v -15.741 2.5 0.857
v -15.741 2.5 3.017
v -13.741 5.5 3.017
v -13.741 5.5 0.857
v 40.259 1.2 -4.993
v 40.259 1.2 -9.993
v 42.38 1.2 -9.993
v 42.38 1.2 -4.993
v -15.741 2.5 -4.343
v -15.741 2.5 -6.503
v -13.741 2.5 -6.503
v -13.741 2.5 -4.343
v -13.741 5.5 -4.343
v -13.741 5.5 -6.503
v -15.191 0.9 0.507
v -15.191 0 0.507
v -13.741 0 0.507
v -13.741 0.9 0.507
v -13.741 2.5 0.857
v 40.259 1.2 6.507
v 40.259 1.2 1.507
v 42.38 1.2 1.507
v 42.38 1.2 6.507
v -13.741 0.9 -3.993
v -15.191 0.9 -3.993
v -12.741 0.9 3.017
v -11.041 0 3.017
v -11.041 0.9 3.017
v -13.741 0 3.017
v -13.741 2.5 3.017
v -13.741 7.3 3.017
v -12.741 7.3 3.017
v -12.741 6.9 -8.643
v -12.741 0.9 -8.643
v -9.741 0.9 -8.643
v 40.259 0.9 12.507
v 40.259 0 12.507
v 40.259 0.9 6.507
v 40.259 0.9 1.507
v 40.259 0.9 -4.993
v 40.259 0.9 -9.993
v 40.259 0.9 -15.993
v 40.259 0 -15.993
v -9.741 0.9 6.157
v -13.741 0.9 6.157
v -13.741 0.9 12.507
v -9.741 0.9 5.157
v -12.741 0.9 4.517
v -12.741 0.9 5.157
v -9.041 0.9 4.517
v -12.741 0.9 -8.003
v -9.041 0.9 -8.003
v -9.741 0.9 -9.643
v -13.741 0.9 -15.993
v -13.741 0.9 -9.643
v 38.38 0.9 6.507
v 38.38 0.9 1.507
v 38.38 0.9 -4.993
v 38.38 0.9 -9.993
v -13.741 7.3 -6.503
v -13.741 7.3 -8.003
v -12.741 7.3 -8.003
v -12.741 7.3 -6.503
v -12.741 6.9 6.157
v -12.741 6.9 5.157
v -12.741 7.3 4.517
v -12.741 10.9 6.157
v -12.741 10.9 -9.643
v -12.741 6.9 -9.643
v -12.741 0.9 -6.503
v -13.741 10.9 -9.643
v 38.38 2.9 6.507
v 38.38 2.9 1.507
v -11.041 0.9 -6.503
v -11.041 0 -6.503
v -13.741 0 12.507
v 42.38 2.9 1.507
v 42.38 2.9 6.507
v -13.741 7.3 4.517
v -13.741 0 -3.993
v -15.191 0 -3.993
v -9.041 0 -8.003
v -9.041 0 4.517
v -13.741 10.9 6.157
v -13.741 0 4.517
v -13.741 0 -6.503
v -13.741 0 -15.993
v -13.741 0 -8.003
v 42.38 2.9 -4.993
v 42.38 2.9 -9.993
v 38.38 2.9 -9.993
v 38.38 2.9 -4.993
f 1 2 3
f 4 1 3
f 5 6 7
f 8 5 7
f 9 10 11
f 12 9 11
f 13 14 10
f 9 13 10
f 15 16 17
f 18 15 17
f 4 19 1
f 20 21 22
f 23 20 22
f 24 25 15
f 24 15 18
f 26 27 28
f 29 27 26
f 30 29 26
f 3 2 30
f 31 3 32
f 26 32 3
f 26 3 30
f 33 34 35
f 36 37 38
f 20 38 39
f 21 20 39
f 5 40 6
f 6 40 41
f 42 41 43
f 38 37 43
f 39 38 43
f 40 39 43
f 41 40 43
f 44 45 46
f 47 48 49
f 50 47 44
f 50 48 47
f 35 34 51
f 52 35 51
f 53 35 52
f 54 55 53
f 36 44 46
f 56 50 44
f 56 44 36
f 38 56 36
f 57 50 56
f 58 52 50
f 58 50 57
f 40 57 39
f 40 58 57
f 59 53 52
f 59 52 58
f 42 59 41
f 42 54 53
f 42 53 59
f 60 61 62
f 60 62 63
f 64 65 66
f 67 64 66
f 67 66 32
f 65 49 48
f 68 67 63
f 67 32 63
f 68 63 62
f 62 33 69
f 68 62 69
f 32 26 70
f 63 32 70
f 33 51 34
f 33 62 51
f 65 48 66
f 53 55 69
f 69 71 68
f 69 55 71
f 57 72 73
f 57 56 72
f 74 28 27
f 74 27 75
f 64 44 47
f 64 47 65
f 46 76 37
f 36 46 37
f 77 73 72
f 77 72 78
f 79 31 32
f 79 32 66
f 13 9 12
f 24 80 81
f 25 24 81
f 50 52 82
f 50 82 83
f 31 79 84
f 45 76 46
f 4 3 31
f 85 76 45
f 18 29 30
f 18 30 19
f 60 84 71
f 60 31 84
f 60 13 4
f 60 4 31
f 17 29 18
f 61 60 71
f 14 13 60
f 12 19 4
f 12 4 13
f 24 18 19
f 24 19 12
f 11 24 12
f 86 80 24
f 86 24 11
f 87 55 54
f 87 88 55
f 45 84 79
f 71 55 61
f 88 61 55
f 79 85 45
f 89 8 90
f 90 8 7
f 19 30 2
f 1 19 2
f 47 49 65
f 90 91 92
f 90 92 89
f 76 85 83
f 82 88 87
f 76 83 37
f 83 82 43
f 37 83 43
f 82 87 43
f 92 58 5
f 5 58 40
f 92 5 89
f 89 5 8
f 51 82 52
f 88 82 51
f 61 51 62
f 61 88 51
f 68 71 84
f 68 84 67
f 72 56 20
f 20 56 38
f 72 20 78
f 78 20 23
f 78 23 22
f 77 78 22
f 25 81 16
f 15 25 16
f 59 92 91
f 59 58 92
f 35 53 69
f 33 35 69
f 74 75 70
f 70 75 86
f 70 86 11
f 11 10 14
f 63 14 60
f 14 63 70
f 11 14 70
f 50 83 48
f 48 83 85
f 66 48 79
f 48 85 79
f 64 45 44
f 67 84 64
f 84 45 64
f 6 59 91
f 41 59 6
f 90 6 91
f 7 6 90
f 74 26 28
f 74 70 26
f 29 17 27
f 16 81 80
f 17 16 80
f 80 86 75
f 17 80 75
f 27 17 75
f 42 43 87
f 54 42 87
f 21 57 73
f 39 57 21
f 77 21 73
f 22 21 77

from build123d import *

# Parameters (mm, degrees)
SALIENTE_EXTRUIR1_DEPTH  = 0.9
CROQUIS2_W               = 1.87835833
CROQUIS2_H               = 5
SALIENTE_EXTRUIR2_DEPTH  = 0.3
CROQUIS3_W               = 4
CROQUIS3_H               = 5
SALIENTE_EXTRUIR4_DEPTH  = 1.7
CROQUIS4_W               = 4
CROQUIS4_H               = 5
SALIENTE_EXTRUIR5_DEPTH  = 1.7
CROQUIS5_W               = 1
CROQUIS5_H               = 15.8
SALIENTE_EXTRUIR6_DEPTH  = 10
SALIENTE_EXTRUIR8_START  = -3.14
SALIENTE_EXTRUIR8_DEPTH  = 2.16
SALIENTE_EXTRUIR9_START  = -3.14
SALIENTE_EXTRUIR9_DEPTH  = 2.16
SALIENTE_EXTRUIR10_DEPTH = 1
SALIENTE_EXTRUIR11_DEPTH = 1
CROQUIS14_W              = 1.5
CROQUIS14_H              = 7.3
CORTAR_EXTRUIR1_DEPTH    = 4.7
CROQUIS16_W              = 2
CROQUIS16_H              = 9.52
CORTAR_EXTRUIR2_DEPTH    = 4.7


with BuildPart() as part:
    # Croquis1 → Saliente-Extruir1 (new body)
    with BuildSketch(Plane(origin=(0, 0, 0), x_dir=(1, 0, 0), z_dir=(0, 1, 0))):
        Polygon((-13.741322015, -0.507016954), (-13.741322015, -12.507016954), (40.258677985, -12.507016954), (40.258677985, 15.992983046), (-13.741322015, 15.992983046), (-13.741322015, 3.992983046), (-15.191322015, 3.992983046), (-15.191322015, -0.507016954), align=None)
    extrude(amount=SALIENTE_EXTRUIR1_DEPTH)

    # Croquis2 → Saliente-Extruir2 (add)
    with BuildSketch(Plane(origin=(0, 0.9, 0), x_dir=(1, 0, 0), z_dir=(0, 1, 0))):
        with Locations((39.31949882, -4.007016954)):
            Rectangle(CROQUIS2_W, CROQUIS2_H)
        with Locations((39.31949882, 7.492983046)):
            Rectangle(CROQUIS2_W, CROQUIS2_H)
    extrude(amount=SALIENTE_EXTRUIR2_DEPTH)

    # Croquis3 → Saliente-Extruir4 (add)
    with BuildSketch(Plane(origin=(0, 1.2, 0), x_dir=(1, 0, 0), z_dir=(0, 1, 0))):
        with Locations((40.380319655, -4.007016954)):
            Rectangle(CROQUIS3_W, CROQUIS3_H)
    extrude(amount=SALIENTE_EXTRUIR4_DEPTH)

    # Croquis4 → Saliente-Extruir5 (add)
    with BuildSketch(Plane(origin=(0, 1.2, 0), x_dir=(1, 0, 0), z_dir=(0, 1, 0))):
        with Locations((40.380319655, 7.492983046)):
            Rectangle(CROQUIS4_W, CROQUIS4_H)
    extrude(amount=SALIENTE_EXTRUIR5_DEPTH)

    # Croquis5 → Saliente-Extruir6 (add)
    with BuildSketch(Plane(origin=(0, 0.9, 0), x_dir=(1, 0, 0), z_dir=(0, 1, 0))):
        with Locations((-13.241322015, 1.742983046)):
            Rectangle(CROQUIS5_W, CROQUIS5_H)
    extrude(amount=SALIENTE_EXTRUIR6_DEPTH)

    # Croquis6 → Saliente-Extruir8 (add)
    with BuildSketch(Plane(origin=(0, 0, -9.642983046), x_dir=(-1, 0, 0), z_dir=(0, 0, -1)).offset(SALIENTE_EXTRUIR8_START)):
        Polygon((13.741322015, 2.5), (13.741322015, 5.5), (15.741322015, 2.5), align=None)
    extrude(amount=-SALIENTE_EXTRUIR8_DEPTH)

    # Croquis9 → Saliente-Extruir9 (add)
    with BuildSketch(Plane.XY.offset(6.157016954).offset(SALIENTE_EXTRUIR9_START)):
        Polygon((-15.741322015, 2.5), (-13.741322015, 5.5), (-13.741322015, 2.5), align=None)
    extrude(amount=-SALIENTE_EXTRUIR9_DEPTH)

    # Croquis12 → Saliente-Extruir10 (add)
    with BuildSketch(Plane(origin=(0, 0, -9.642983046), x_dir=(-1, 0, 0), z_dir=(0, 0, -1))):
        Polygon((12.741322015, 0.9), (9.741322015, 0.9), (12.741322015, 6.9), align=None)
    extrude(amount=-SALIENTE_EXTRUIR10_DEPTH)

    # Croquis13 → Saliente-Extruir11 (add)
    with BuildSketch(Plane.XY.offset(6.157016954)):
        Polygon((-12.741322015, 0.9), (-9.741322015, 0.9), (-12.741322015, 6.9), align=None)
    extrude(amount=-SALIENTE_EXTRUIR11_DEPTH)

    # Croquis14 → Cortar-Extruir1 (cut)
    with BuildSketch(Plane.ZY.offset(13.741322015)):
        with Locations((3.767016954, 3.65)):
            Rectangle(CROQUIS14_W, CROQUIS14_H)
        with Locations((-7.252983046, 3.65)):
            Rectangle(CROQUIS14_W, CROQUIS14_H)
    extrude(amount=-CORTAR_EXTRUIR1_DEPTH, mode=Mode.SUBTRACT)

    # Croquis16 → Cortar-Extruir2 (cut)
    with BuildSketch(Plane(origin=(0, 0.9, 0), x_dir=(1, 0, 0), z_dir=(0, 1, 0))):
        with Locations((-10.041322015, 1.742983046)):
            Rectangle(CROQUIS16_W, CROQUIS16_H)
    extrude(amount=-CORTAR_EXTRUIR2_DEPTH, mode=Mode.SUBTRACT)


solid = part.part
